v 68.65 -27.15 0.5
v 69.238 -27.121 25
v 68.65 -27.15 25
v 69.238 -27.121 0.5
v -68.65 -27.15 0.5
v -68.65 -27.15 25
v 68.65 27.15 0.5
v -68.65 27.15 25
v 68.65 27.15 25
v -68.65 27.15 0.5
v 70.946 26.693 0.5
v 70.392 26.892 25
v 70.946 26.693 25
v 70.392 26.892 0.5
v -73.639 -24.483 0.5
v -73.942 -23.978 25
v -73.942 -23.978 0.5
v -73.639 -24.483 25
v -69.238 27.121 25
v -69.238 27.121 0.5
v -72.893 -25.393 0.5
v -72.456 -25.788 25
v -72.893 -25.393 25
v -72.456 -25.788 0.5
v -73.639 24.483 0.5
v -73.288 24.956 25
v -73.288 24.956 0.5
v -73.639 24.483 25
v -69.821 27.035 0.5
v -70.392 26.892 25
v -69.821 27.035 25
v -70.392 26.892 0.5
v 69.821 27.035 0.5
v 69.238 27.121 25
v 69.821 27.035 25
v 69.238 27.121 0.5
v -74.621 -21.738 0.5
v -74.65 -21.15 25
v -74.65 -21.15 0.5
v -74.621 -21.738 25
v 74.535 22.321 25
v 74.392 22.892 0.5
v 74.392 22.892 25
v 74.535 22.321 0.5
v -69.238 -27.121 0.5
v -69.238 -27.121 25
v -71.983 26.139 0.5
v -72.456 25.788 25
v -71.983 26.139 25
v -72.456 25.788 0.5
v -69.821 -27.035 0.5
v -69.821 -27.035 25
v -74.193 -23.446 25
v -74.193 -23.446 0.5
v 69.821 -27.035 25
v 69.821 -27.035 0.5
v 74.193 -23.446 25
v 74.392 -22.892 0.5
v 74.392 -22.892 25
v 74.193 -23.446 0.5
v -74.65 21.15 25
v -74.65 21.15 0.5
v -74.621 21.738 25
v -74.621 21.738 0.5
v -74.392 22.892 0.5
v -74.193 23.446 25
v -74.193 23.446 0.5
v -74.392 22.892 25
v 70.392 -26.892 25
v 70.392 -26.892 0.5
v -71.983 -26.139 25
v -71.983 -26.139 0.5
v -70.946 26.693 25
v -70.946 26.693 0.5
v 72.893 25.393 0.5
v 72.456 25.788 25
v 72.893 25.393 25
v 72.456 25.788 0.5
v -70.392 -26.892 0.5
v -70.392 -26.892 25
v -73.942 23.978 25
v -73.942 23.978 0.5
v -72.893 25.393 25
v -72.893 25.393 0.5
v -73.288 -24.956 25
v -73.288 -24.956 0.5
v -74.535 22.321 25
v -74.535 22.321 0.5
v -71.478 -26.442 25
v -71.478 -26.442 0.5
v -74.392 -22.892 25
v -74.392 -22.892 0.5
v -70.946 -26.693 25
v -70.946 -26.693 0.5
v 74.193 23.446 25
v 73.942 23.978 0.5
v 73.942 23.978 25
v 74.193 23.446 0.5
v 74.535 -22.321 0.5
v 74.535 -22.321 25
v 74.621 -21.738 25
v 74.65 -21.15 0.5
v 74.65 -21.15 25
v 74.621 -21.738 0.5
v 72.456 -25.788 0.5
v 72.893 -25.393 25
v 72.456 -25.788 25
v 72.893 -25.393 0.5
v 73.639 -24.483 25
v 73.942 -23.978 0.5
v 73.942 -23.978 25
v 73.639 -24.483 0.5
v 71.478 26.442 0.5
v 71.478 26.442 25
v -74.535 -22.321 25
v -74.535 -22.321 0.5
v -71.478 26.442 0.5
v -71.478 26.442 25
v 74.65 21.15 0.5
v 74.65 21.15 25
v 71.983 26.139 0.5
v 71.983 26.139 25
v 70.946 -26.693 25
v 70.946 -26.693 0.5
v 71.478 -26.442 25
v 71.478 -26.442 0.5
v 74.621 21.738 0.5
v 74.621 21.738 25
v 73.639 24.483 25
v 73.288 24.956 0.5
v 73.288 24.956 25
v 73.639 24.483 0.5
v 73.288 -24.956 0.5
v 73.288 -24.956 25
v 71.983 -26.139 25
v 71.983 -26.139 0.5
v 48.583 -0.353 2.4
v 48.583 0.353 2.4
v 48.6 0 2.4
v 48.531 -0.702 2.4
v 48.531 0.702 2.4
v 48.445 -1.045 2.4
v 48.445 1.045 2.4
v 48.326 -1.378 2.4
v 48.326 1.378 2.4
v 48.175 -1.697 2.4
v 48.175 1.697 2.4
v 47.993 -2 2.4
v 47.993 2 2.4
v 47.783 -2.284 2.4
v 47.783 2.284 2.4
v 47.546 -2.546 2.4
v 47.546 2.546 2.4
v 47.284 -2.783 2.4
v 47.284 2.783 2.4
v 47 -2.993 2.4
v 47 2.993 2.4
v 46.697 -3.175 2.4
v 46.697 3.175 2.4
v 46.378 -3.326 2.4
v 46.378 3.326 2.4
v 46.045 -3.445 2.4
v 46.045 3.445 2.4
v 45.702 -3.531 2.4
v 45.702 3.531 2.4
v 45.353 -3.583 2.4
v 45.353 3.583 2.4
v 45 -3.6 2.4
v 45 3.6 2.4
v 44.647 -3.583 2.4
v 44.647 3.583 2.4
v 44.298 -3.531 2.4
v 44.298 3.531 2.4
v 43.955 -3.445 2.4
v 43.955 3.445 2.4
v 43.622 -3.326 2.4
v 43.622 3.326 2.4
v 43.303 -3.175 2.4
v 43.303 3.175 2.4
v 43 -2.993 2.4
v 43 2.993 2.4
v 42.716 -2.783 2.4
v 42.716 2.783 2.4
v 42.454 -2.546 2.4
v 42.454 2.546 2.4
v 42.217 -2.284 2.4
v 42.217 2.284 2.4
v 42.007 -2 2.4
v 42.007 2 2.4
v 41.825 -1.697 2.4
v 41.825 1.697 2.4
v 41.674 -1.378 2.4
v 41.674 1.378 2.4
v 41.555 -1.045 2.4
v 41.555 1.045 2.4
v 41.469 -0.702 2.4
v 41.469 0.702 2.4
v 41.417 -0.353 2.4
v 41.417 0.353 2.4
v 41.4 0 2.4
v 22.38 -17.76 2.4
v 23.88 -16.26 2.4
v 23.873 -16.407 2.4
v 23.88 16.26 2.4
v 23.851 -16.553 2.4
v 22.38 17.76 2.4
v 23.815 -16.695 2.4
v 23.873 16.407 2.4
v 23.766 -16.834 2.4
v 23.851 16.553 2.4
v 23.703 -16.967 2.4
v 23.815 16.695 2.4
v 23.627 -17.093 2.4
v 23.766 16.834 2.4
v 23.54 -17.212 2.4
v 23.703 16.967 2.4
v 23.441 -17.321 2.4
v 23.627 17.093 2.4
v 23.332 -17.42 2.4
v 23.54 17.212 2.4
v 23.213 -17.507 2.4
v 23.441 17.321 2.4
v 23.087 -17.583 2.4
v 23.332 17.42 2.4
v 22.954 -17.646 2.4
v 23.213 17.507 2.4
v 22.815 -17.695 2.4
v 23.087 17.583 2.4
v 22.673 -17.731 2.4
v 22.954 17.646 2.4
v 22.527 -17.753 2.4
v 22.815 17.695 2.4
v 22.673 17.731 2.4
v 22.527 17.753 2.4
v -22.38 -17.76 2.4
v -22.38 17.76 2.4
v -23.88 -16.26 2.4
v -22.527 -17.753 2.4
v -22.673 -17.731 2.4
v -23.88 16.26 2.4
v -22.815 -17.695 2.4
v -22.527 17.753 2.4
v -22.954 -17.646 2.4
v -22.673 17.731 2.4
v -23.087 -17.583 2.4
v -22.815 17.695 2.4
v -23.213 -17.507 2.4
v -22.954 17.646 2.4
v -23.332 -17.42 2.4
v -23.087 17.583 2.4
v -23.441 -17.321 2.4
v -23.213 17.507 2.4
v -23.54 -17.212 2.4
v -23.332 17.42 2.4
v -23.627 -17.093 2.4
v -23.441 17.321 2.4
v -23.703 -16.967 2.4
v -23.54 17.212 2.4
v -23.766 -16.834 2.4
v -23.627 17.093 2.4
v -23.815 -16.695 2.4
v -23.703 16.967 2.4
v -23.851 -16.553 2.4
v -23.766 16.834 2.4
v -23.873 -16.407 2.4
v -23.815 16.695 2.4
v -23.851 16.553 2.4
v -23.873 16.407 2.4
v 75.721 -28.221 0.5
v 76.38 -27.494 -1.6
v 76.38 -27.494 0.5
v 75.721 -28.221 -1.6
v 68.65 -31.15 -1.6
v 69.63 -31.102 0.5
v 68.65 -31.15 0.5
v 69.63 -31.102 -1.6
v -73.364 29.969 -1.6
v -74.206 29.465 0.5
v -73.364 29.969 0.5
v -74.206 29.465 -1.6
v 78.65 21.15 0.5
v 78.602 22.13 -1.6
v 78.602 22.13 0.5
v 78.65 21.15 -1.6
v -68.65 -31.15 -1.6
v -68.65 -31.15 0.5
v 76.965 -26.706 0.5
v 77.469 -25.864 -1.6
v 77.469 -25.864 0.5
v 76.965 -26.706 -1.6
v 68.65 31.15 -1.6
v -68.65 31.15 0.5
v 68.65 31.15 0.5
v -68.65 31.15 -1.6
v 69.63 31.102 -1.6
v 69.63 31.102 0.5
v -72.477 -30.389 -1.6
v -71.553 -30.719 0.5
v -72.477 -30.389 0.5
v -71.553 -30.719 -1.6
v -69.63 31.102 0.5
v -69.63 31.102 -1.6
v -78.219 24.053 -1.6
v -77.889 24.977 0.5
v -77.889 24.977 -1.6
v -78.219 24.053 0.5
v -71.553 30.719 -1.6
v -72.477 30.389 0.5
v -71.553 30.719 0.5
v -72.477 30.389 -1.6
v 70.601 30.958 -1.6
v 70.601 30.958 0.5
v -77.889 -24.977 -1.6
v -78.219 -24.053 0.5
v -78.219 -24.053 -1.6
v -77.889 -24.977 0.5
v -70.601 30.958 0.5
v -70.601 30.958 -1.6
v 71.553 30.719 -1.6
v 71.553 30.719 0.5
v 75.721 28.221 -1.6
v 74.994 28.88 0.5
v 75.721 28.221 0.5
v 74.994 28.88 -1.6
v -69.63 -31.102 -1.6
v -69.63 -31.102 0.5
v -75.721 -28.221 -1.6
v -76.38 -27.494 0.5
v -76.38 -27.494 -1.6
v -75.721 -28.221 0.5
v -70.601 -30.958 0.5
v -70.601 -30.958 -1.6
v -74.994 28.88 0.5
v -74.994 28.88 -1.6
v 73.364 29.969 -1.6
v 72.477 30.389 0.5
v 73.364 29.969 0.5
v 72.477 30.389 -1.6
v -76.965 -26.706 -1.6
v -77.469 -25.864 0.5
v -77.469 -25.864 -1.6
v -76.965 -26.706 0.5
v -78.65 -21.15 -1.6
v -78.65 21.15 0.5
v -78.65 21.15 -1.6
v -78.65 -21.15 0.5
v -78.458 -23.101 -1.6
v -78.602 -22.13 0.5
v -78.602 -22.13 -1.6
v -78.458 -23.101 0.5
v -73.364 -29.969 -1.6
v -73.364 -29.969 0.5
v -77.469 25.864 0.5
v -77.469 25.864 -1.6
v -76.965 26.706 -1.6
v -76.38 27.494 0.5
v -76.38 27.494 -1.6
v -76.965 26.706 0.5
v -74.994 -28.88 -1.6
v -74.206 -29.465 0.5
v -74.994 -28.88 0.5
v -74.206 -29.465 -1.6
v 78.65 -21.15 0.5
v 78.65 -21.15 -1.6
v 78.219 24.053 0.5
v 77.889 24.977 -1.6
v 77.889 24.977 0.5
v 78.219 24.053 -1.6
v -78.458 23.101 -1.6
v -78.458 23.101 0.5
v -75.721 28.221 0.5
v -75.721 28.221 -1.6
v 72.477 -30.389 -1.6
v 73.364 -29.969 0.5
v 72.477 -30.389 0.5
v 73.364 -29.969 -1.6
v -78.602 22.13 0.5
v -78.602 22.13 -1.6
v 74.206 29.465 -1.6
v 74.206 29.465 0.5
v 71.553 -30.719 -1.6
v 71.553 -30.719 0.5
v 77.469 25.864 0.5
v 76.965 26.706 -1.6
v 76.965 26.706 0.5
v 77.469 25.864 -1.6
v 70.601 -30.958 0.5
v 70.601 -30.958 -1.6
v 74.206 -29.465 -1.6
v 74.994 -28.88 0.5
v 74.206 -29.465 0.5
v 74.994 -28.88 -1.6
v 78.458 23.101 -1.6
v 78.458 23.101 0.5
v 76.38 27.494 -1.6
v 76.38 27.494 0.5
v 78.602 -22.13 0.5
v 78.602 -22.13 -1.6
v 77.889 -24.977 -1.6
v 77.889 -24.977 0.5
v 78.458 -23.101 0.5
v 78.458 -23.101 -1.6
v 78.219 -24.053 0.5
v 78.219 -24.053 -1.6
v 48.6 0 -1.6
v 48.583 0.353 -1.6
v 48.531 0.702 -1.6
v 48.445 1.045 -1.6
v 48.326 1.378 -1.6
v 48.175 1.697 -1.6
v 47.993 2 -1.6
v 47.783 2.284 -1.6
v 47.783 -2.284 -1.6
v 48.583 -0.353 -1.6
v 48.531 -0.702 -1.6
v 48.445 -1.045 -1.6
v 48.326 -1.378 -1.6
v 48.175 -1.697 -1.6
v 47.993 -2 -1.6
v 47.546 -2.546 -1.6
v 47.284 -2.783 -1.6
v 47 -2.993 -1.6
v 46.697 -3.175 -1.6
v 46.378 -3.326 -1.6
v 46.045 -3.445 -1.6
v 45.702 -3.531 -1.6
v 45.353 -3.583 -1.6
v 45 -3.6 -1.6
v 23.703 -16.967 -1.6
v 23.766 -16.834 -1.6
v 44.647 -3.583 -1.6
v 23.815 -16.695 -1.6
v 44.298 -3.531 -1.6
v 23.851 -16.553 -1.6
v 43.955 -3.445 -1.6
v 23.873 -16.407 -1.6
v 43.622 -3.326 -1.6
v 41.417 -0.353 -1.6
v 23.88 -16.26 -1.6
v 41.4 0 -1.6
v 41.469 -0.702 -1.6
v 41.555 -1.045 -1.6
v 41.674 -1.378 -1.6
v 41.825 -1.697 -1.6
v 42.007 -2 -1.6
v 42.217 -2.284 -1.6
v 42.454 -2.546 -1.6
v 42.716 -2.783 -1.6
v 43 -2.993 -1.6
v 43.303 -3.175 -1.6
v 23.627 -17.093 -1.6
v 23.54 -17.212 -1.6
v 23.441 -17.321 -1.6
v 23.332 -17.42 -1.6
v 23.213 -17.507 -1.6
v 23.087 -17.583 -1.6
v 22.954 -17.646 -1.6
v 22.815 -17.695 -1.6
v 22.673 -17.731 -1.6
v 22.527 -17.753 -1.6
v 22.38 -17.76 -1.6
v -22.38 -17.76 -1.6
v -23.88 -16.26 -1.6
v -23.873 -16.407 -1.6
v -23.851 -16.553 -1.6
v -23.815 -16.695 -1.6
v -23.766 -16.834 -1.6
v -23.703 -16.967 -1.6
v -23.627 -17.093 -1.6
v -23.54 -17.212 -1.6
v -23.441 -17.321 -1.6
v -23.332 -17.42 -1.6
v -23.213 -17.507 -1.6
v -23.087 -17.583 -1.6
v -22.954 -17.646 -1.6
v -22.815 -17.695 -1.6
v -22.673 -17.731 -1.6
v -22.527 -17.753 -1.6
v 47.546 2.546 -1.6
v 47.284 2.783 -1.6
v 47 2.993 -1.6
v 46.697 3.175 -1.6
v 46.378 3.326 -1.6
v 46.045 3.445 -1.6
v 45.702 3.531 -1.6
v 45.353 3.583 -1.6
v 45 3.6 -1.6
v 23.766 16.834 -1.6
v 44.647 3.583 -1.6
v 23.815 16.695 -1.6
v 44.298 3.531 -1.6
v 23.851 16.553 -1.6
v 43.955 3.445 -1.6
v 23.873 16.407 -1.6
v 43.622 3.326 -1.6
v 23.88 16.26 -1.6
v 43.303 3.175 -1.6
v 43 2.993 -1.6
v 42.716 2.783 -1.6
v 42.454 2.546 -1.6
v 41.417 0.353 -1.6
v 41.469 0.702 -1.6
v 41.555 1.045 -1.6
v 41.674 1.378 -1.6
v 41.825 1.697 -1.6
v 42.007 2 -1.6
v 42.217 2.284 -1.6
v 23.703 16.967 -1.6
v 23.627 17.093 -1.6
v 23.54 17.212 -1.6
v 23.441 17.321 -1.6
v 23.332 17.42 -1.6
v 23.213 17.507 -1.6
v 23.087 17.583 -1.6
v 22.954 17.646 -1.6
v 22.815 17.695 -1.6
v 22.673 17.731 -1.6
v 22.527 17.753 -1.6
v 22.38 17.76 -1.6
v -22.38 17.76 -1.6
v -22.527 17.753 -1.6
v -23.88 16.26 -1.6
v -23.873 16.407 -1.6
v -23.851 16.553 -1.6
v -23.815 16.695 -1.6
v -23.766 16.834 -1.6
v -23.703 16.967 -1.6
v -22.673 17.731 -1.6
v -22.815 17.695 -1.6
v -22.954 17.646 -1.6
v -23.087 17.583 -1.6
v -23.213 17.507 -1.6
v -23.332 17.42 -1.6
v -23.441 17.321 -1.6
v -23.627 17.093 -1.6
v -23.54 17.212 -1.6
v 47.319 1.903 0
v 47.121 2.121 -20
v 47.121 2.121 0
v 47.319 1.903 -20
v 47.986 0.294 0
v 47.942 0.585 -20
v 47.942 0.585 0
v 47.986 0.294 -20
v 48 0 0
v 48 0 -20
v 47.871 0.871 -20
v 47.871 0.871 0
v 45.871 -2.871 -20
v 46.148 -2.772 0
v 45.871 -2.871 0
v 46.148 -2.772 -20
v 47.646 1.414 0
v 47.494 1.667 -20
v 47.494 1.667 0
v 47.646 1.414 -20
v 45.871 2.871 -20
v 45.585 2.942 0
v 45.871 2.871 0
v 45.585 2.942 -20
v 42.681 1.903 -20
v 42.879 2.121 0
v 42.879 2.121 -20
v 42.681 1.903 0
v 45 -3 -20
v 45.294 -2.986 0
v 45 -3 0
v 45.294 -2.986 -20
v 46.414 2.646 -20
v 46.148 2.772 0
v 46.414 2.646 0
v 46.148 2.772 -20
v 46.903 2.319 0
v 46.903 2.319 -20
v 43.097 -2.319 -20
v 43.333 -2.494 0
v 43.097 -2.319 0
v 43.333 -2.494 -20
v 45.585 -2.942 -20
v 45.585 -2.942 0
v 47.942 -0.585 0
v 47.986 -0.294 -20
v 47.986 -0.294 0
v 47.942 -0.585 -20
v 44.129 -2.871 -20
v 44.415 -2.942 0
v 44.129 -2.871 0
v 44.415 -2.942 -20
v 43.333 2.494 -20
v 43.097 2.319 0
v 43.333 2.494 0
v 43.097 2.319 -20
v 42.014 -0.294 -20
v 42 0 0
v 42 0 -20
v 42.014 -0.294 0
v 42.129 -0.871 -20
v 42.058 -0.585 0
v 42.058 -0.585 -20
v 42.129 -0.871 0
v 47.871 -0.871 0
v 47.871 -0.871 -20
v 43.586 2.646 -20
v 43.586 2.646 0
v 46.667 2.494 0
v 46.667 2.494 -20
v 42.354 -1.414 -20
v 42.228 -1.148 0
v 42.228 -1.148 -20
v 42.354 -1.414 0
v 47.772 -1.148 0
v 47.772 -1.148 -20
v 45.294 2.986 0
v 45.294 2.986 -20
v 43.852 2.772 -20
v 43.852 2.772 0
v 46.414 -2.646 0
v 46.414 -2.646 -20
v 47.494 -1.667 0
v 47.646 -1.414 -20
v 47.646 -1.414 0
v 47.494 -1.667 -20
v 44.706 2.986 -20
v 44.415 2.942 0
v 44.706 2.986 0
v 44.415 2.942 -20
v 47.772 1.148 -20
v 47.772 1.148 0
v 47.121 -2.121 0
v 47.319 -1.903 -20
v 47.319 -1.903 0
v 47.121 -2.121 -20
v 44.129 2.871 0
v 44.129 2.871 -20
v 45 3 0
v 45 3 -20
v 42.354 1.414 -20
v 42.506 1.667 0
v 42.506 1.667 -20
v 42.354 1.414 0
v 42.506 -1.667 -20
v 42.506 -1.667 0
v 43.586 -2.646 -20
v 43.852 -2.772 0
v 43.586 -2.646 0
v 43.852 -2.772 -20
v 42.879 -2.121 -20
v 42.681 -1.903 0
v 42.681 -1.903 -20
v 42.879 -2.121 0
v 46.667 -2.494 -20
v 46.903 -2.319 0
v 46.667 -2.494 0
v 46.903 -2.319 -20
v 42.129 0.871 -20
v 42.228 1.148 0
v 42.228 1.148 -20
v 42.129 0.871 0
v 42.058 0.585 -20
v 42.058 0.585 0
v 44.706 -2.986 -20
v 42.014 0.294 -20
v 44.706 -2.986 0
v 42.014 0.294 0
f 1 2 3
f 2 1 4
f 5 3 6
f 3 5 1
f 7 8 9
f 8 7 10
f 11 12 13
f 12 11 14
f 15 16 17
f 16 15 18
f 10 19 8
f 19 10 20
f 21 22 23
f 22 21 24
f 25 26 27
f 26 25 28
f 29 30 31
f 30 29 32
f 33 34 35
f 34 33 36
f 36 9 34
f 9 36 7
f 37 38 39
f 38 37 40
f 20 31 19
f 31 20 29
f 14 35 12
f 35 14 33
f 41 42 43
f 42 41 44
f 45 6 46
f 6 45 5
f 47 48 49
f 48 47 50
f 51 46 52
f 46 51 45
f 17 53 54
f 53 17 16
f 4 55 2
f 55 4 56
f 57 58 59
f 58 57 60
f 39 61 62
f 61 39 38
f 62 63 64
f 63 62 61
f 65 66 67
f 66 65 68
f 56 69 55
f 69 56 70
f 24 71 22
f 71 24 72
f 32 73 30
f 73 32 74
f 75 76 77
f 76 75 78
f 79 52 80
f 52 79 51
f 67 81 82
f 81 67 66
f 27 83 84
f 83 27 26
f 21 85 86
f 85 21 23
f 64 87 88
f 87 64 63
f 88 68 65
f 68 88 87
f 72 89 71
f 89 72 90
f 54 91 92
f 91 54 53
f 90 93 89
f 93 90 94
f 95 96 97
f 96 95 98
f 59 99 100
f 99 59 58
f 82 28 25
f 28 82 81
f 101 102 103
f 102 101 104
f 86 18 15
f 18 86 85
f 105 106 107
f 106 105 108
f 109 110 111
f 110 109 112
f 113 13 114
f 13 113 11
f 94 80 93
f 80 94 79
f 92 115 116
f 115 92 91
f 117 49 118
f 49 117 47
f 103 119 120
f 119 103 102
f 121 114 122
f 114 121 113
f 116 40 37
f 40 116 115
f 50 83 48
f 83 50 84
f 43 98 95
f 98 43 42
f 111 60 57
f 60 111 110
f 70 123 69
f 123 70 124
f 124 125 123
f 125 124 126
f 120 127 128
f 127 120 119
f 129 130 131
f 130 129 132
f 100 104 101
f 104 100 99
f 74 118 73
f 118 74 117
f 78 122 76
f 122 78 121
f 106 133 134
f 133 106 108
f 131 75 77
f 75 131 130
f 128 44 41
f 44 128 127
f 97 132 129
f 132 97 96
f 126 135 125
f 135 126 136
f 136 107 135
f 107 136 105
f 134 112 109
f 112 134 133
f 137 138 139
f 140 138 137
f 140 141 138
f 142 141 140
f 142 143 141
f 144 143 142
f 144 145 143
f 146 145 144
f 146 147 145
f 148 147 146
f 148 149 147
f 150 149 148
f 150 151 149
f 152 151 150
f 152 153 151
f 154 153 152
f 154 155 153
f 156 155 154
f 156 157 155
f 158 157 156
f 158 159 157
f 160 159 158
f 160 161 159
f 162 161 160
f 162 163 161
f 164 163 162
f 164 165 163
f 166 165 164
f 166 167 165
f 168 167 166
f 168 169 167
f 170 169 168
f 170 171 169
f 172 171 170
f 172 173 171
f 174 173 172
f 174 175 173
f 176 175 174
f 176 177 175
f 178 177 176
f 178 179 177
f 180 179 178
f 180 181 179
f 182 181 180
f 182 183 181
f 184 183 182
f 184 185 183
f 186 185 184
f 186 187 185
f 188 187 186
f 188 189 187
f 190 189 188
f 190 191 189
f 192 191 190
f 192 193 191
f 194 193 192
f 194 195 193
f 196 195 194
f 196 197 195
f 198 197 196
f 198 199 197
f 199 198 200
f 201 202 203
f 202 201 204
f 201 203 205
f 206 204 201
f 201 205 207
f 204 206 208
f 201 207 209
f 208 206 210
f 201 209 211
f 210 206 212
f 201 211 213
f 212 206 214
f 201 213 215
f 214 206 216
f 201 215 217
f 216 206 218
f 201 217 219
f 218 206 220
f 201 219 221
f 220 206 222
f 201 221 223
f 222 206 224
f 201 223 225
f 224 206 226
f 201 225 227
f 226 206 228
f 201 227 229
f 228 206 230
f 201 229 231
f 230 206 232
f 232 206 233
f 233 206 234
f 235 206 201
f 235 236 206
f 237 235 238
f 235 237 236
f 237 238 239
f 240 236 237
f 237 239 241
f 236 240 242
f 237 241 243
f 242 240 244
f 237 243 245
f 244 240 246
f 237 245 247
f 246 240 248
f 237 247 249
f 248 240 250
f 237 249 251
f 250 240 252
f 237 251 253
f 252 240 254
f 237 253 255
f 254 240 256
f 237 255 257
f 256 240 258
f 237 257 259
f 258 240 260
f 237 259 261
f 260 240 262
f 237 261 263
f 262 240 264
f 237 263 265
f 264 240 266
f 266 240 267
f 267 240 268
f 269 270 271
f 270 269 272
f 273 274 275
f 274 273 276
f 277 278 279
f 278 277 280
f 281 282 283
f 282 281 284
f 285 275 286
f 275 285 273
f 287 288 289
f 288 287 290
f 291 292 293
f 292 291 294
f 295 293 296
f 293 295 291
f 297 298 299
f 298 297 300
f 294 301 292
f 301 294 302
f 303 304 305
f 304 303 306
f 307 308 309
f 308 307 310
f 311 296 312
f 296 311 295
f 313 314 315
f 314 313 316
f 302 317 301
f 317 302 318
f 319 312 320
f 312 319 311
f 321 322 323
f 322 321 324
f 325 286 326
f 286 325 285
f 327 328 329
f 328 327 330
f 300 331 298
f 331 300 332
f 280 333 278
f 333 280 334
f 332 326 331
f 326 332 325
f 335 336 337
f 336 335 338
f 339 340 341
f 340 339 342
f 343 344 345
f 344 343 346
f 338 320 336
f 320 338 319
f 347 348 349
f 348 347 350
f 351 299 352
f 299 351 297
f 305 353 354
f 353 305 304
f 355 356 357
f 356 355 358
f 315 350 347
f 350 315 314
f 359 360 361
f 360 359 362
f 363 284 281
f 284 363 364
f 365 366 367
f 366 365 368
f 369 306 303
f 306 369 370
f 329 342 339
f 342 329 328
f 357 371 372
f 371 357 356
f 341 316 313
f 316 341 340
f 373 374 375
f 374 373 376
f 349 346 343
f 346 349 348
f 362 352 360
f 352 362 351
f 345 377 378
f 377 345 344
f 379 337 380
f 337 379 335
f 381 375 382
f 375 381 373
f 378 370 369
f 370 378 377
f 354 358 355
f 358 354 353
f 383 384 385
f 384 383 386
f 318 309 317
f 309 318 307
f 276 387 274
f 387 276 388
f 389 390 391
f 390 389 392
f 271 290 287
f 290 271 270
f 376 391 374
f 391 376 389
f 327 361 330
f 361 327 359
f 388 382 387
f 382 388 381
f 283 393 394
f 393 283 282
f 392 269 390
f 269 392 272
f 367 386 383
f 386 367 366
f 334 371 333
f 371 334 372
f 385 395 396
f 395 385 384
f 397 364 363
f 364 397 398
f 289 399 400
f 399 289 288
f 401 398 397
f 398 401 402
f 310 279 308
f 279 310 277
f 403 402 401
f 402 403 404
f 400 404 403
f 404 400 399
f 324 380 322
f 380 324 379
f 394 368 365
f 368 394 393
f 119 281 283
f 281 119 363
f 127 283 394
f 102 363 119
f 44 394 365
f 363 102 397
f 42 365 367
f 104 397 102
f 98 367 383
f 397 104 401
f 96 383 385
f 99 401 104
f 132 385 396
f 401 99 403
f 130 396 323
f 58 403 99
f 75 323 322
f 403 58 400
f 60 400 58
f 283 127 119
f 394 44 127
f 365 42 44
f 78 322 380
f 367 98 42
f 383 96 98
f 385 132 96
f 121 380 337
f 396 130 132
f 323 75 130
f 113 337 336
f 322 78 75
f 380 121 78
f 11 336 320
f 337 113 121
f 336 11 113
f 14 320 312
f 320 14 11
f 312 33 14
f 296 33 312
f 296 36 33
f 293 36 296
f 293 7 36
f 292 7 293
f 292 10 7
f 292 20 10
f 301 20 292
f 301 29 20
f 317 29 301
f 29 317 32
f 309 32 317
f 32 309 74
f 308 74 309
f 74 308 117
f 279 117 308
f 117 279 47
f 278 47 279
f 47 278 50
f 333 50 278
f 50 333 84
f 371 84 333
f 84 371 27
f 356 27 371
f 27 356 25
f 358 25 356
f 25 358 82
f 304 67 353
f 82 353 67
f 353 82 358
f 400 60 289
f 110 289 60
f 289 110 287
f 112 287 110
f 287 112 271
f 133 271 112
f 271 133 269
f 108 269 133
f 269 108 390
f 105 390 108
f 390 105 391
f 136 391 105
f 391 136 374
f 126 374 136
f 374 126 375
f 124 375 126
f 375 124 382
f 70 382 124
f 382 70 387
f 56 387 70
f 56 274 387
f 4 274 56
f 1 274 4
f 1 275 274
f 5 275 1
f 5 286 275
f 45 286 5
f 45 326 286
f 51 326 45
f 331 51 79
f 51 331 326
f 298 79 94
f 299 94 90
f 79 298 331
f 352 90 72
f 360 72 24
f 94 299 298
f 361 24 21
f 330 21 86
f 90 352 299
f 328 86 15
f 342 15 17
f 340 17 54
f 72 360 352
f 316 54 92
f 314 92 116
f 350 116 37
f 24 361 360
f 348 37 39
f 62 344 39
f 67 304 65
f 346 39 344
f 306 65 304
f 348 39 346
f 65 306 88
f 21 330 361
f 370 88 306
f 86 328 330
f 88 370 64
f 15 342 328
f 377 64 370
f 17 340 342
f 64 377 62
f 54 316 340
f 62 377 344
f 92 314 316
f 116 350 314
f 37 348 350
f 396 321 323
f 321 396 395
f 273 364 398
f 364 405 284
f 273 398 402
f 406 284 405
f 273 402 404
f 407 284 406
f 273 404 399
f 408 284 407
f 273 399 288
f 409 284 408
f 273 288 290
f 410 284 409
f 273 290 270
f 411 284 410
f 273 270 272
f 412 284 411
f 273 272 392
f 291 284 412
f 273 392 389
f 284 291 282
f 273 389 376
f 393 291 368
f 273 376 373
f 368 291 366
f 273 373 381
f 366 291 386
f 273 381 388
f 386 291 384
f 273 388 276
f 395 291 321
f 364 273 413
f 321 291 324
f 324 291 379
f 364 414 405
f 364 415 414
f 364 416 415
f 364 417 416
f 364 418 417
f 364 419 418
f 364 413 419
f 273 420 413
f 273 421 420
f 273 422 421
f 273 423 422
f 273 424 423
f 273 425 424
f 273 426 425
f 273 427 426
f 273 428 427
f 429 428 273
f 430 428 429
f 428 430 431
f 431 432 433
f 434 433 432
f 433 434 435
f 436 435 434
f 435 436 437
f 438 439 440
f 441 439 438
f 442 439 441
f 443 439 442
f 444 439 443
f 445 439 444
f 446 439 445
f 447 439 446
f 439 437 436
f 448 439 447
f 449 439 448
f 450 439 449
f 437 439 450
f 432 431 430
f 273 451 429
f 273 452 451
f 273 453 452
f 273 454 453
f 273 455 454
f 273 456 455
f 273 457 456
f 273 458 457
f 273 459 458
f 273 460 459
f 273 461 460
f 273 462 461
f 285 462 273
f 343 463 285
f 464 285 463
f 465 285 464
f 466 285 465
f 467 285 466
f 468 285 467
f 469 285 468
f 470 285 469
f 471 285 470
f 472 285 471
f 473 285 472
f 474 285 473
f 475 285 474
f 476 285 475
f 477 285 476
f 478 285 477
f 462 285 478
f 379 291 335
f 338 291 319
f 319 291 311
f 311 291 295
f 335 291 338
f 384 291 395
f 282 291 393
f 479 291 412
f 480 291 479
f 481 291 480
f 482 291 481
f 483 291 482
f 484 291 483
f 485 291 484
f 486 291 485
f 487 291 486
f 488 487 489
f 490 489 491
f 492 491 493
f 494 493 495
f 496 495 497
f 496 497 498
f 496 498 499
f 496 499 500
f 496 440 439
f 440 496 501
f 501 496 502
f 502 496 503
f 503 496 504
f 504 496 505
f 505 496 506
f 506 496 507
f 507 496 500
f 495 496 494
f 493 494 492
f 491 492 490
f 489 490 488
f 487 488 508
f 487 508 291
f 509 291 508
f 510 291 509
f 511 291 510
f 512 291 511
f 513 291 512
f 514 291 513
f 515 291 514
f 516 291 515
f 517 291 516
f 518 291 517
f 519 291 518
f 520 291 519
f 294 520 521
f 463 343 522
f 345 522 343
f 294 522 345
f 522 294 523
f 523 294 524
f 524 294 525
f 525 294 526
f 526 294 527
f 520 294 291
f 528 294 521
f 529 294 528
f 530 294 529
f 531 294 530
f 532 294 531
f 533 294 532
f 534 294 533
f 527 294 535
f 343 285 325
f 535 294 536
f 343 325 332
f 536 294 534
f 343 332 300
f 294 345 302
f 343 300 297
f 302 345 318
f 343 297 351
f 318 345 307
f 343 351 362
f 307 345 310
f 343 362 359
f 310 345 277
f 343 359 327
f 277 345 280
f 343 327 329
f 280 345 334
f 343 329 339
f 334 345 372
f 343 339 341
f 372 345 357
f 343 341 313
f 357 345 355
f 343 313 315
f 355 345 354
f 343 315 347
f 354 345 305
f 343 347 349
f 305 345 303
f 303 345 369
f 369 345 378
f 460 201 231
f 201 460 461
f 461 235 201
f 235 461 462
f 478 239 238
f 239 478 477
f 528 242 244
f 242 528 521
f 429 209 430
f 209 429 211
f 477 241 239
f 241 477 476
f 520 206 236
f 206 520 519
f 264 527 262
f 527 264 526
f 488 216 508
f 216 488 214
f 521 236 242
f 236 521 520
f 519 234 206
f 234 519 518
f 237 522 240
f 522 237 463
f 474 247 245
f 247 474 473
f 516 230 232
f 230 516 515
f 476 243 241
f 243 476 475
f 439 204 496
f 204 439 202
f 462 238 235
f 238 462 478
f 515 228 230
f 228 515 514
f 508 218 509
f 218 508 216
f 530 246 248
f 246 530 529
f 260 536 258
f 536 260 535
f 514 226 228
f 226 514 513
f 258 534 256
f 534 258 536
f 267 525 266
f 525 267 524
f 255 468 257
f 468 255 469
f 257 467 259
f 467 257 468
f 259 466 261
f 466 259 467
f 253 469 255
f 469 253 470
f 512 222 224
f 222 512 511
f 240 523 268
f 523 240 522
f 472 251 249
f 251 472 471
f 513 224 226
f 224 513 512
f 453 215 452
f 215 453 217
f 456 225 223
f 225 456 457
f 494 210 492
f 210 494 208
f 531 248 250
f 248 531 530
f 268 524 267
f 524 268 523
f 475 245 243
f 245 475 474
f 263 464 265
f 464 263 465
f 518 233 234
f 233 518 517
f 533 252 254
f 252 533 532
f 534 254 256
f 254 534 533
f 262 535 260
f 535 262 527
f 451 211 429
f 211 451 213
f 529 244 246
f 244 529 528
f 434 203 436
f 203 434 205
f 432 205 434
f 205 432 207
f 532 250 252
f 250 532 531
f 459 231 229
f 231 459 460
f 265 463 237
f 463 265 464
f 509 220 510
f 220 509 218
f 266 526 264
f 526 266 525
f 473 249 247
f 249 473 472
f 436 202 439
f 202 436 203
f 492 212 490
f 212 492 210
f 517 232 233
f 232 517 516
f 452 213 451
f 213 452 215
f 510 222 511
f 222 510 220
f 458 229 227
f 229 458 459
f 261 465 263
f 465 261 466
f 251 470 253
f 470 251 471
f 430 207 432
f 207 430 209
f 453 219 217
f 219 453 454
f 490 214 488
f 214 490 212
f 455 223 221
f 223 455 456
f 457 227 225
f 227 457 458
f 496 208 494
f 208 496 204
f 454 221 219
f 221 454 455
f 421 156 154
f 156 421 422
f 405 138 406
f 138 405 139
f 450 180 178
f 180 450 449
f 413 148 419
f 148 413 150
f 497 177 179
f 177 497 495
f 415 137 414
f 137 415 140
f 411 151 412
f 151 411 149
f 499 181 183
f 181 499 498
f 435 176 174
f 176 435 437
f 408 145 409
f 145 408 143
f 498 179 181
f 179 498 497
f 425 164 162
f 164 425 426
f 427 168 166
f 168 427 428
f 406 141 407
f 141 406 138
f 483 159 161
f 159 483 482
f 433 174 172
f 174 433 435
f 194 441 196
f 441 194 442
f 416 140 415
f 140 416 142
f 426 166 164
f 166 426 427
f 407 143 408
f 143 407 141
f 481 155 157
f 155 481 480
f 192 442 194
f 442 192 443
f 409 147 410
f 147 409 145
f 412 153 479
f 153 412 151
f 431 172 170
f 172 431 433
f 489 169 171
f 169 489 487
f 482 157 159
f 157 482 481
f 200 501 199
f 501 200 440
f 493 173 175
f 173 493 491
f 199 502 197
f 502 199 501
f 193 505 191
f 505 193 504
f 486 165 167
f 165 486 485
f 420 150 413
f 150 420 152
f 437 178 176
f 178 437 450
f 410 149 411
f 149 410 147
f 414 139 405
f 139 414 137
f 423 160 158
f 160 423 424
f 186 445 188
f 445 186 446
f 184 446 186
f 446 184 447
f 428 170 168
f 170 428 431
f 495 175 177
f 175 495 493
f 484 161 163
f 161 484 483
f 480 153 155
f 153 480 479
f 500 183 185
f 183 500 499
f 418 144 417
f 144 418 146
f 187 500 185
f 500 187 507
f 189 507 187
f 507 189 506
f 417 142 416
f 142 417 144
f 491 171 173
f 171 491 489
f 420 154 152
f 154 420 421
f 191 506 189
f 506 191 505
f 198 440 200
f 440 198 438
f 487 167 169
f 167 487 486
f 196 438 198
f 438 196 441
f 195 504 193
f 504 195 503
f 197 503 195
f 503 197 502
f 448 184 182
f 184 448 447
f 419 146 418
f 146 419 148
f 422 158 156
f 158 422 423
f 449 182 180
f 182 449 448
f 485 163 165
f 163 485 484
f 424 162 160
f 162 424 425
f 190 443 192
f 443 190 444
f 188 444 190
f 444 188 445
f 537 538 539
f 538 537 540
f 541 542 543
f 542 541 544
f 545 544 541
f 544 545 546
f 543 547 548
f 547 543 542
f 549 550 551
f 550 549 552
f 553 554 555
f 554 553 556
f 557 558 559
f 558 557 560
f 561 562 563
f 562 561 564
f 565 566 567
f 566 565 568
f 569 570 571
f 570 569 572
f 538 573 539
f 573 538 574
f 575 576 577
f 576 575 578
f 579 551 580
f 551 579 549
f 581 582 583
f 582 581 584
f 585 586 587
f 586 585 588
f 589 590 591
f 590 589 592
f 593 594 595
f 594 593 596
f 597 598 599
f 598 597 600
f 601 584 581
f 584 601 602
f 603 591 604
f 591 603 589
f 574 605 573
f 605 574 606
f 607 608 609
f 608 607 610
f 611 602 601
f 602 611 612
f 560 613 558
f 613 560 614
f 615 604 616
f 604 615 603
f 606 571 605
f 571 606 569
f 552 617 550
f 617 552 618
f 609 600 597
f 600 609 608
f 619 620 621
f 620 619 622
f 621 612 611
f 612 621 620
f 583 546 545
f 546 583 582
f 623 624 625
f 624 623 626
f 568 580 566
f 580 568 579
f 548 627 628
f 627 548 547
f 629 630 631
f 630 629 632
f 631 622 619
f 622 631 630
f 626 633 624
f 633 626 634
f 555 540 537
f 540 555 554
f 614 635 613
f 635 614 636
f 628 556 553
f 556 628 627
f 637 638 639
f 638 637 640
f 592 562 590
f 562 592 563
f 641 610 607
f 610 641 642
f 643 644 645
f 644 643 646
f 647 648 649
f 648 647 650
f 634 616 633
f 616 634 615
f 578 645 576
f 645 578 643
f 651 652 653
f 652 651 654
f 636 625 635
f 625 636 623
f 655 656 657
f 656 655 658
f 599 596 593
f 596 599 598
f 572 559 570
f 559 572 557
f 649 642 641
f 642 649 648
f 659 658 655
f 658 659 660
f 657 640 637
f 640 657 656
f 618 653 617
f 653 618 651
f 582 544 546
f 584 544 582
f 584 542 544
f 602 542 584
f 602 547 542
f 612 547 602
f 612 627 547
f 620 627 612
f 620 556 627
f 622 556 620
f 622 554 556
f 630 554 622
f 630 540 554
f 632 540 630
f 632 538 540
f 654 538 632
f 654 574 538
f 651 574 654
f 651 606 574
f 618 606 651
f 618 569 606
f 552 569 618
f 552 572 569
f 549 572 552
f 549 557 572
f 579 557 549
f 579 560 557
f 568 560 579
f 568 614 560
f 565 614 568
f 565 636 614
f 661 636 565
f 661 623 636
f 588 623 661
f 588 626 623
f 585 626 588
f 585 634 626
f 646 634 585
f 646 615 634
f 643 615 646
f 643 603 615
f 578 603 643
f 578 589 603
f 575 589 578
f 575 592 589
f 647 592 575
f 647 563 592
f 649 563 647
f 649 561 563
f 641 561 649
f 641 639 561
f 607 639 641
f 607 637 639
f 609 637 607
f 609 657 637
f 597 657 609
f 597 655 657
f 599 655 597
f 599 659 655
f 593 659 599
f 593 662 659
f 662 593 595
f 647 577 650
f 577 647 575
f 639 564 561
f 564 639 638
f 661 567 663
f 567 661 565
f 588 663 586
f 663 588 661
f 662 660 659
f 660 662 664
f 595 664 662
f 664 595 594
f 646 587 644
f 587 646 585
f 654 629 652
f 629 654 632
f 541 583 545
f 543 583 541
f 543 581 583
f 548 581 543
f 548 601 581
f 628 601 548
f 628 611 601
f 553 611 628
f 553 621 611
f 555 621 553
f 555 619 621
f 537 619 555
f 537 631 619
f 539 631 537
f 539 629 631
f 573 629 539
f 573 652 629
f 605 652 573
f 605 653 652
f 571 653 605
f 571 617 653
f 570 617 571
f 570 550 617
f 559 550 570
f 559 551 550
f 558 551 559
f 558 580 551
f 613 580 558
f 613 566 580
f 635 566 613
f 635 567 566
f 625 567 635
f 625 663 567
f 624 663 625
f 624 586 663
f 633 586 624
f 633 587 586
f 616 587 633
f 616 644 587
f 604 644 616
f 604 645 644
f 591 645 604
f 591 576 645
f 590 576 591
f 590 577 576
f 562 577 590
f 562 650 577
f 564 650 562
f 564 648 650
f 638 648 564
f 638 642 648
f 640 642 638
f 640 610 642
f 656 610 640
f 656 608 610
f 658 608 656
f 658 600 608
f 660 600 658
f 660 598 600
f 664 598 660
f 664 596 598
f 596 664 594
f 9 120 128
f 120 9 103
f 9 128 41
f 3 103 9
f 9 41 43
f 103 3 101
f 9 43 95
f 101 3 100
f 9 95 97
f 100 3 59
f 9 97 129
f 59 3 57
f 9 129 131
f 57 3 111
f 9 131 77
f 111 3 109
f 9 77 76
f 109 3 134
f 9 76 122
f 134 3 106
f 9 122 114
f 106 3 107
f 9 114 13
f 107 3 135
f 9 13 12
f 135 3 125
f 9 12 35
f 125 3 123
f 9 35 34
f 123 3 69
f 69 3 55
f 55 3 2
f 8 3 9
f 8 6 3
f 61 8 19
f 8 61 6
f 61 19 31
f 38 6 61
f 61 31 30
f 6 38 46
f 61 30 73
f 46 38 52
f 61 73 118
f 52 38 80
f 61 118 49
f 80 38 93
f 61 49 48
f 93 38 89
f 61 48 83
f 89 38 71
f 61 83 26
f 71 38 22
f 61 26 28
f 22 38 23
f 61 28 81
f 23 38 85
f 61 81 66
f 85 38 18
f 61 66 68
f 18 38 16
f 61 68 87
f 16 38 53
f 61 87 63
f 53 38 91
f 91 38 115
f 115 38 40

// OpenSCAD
// ============================================================
//  vent-insert.scad — BMW F30 driver-side air vent → screen + encoder insert
//
//  CONCEPT: do NOT reprint the vent. Keep the OEM assembly (wood trim, chrome
//  strip, thumbwheel, spring clips, duct + foam gasket, shutoff damper). Cut out
//  ONLY the louvers and the centre tab, then drop this insert into the opening.
//  Its flange hides the cut edges. Reversible in spirit, and it keeps every hard
//  part (sealing, retention, damper) as the factory made it.
//
//  ── MEASUREMENT POLICY ──────────────────────────────────────────────────────
//  Numbers marked  ### MEASURE ###  are NOT known. They are placeholders so the
//  model previews. The real BMW vent aperture is not published anywhere (checked),
//  and the supplied Meshy scan has no real-world scale (arbitrary units, 2.2 M
//  verts, AI-reconstructed) — so it CANNOT be used for fitting dimensions.
//  Replace each one with a caliper reading before printing anything.
//
//  Numbers marked  [VERIFIED]  are from datasheets/vendor specs — leave them
//  alone unless your specific part differs.
//
//  PRINT IN ASA OR PETG. NOT PLA. A dash in summer sun exceeds PLA's ~60 °C
//  glass transition and the part will sag and fall out.
// ============================================================

/* [Scan-derived proportions — USE THESE TO CROSS-CHECK YOUR MEASUREMENTS]
   Extracted from the supplied Meshy scan by bounding-box analysis over all
   2,197,028 vertices. A bounding box over that many points is statistically
   robust even though the surface itself is noisy, so these RATIOS are usable
   even though the scan's absolute scale is meaningless.

        overall  W : H : D  =  1 : 0.4709 : 0.6065

   So: measure the overall vent width once, and the other two follow.
   Set vent_overall_w below and the model will echo the expected height/depth —
   if your calipers disagree badly, something's wrong and you should re-measure.

   NOT extractable from the scan (proven, not assumed): the louver aperture,
   corner radii, and internal depth. Two computational attempts failed because
   the mesh has no dominant surface plane — the largest normal cluster is only
   0.1% of vertices, i.e. it's reconstructed blob, not flat molded faces.       */
vent_overall_w    = 0;     // ### MEASURE ### overall vent width; 0 = skip check

/* [Vent aperture — MEASURE THESE FIRST] */
// Width of the louver opening (inner aperture of the black surround)
vent_w            = 150;   // ### MEASURE ###
// Height of that opening
vent_h            = 55;    // ### MEASURE ###
// Corner radius of the opening
vent_corner_r     = 6;     // ### MEASURE ###
// Usable depth from the face plane back to the first obstruction (damper/vane).
// THIS IS THE CRITICAL ONE — it decides whether the screen+PCB fit at all.
vent_depth_avail  = 25;    // ### MEASURE ###
// How much lip/bezel the flange can overlap without fouling the trim
flange_overlap    = 4;     // ### MEASURE ###

/* [Insert construction] */
plate_t           = 2.4;   // faceplate thickness
flange_t          = 1.6;   // flange thickness (sits proud on the bezel)
wall              = 2.0;   // side wall thickness
fit_clearance     = 0.35;  // per-side gap so it actually drops in (print-tuned)
screen_bezel_lap  = 0.6;   // faceplate overlaps LCD active edge, hides the border

/* [Airflow — keep the vent working]
   A screen that blocks the whole aperture turns a working vent into a blank.
   P3Cars' vent-integrated display retains airflow, and your own servo/temp plan
   depends on air still moving (cold air = free cooling for the stack, hot air =
   servo shuts the damper). So the insert carries flow slots around the screen. */
airflow           = true;
slot_w            = 3.2;   // slot width
slot_gap          = 3.0;   // gap between slots
slot_margin       = 3.0;   // keep slots this far off the screen pocket + edges

/* [2.4" ILI9341 module — VERIFIED, change only if your module differs] */
// PCB 43 x 72 x 5 mm; active area 36.72 x 48.96 mm
scr_pcb_w         = 72.0;  // [VERIFIED] long axis — mounted LANDSCAPE
scr_pcb_h         = 43.0;  // [VERIFIED]
scr_pcb_t         = 5.0;   // [VERIFIED] board + components
scr_act_w         = 48.96; // [VERIFIED] active area long axis
scr_act_h         = 36.72; // [VERIFIED]
// Offset of the active area centre from the PCB centre.
scr_act_dx        = 0;     // ### MEASURE ### (on your module)
scr_act_dy        = 0;     // ### MEASURE ###
scr_pocket_clear  = 0.4;   // slack around the PCB in its pocket

/* [EC11 encoder — partially verified] */
ec11_body         = 12.5;  // [VERIFIED] ~12.5 mm square body
ec11_body_h       = 7.5;   // [VERIFIED] body height behind panel
ec11_bush_d       = 7.2;   // M7x0.75 bushing -> 7 mm hole + clearance  ### CONFIRM ###
ec11_shaft_len    = 20;    // ### MEASURE ### varies by variant; sets knob standoff
// Encoder centre, measured from the insert centre (+x = toward the thumbwheel side)
enc_x             = 45;    // ### CHOOSE after measuring aperture ###
enc_y             = 0;

/* [Teensy carrier — mounts behind the insert]
   The Teensy lives AT the vent, not in the remote box: the TFT is SPI at tens of
   MHz and will not survive a multi-foot cable run, and encoder edges pick up
   noise. Local MCU -> one robust cable (12 V + UART/CAN) back to the main box.
   See ../interconnect.md.                                                     */
teensy_w          = 61.0;  // ### CONFIRM ### Teensy 4.1 length
teensy_h          = 18.0;  // ### CONFIRM ### width
teensy_t          = 4.0;   // board + headers clearance
carrier_t         = 2.6;
boss_d            = 7.0;   // mounting bosses on the insert's back
boss_screw_d      = 2.6;   // M2.5 self-tap
boss_inset        = 9.0;   // from the aperture edge

/* [Render] */
$fn               = 64;
explode           = 0;     // set >0 to separate parts in preview
// "print" = insert only, ready to slice.  "preview" = adds ghost screen/encoder/
// depth-envelope so you can eyeball clearances. NEVER slice a preview export:
// the ghosts are separate solids and would be printed.
render_mode       = "preview";   // ["print","preview"]

// ============================================================
//  Sanity checks — the model tells you if it cannot fit
// ============================================================
inner_w = vent_w - 2*fit_clearance;
inner_h = vent_h - 2*fit_clearance;

// Scan-derived proportions (bounding box over 2,197,028 vertices)
SCAN_H_RATIO = 0.4709;
SCAN_D_RATIO = 0.6065;

module _checks() {
    if (vent_overall_w > 0) {
        echo(str("SCAN CROSS-CHECK: for overall width ", vent_overall_w,
                 " mm, the scan proportions predict overall height ",
                 vent_overall_w * SCAN_H_RATIO, " mm and overall depth ",
                 vent_overall_w * SCAN_D_RATIO, " mm."));
        echo("  -> compare against your calipers. Large disagreement = re-measure.");
        if (vent_depth_avail > vent_overall_w * SCAN_D_RATIO)
            echo(str("*** WARN: usable depth ", vent_depth_avail,
                     " mm exceeds the part's whole predicted depth ",
                     vent_overall_w * SCAN_D_RATIO, " mm. Check measurement #3."));
    }
    if (scr_pcb_w > inner_w)
        echo(str("*** FAIL: screen PCB ", scr_pcb_w, " mm wider than aperture ",
                 inner_w, " mm. Screen will not fit landscape."));
    if (scr_pcb_h > inner_h)
        echo(str("*** FAIL: screen PCB ", scr_pcb_h, " mm taller than aperture ",
                 inner_h, " mm."));
    if (scr_pcb_t + plate_t > vent_depth_avail)
        echo(str("*** FAIL: screen stack ", scr_pcb_t + plate_t,
                 " mm deeper than available ", vent_depth_avail, " mm."));
    if (abs(enc_x) + ec11_body/2 > inner_w/2)
        echo("*** FAIL: encoder falls outside the aperture.");
    // Does the screen + encoder both fit across the width?
    needed = scr_pcb_w + ec11_body + 4;
    if (needed > inner_w)
        echo(str("*** WARN: screen + encoder need ", needed,
                 " mm across; aperture is ", inner_w,
                 " mm. Consider stacking the encoder below, or a smaller screen."));
}

// ============================================================
//  Helpers
// ============================================================
module rrect(w, h, r, t) {           // rounded rectangular prism
    linear_extrude(height = t)
        offset(r = r) offset(r = -r)
            square([w, h], center = true);
}

// ============================================================
//  The insert
// ============================================================
// Parts must OVERLAP, not merely touch. Coincident planes are not reliably fused
// by CGAL and produce disconnected solids (caught in testing: Volumes reported 4,
// i.e. 3 separate bodies, instead of 2 for one closed solid).
ov = 0.5;   // interference between mating features

module vent_insert() {
    difference() {
        union() {
            // faceplate that sits in the aperture
            rrect(inner_w, inner_h, vent_corner_r, plate_t);
            // flange, proud of the face, hides the cut louver edges.
            // Extended UP into the plate by `ov` so the two fuse.
            translate([0, 0, -flange_t])
                rrect(inner_w + 2*flange_overlap,
                      inner_h + 2*flange_overlap,
                      vent_corner_r + flange_overlap, flange_t + ov);
            // side walls going back into the vent, stiffen + locate.
            // Started `ov` BELOW the plate top so they bite into it.
            translate([0, 0, plate_t - ov])
                difference() {
                    rrect(inner_w, inner_h, vent_corner_r, wall_depth() + ov);
                    translate([0, 0, -0.1])
                        rrect(inner_w - 2*wall, inner_h - 2*wall,
                              max(vent_corner_r - wall, 0.5), wall_depth() + ov + 0.2);
                }
            // pocket walls that capture the screen PCB (also overlapped)
            translate([0, 0, plate_t - ov]) screen_pocket_walls();
            // bosses the Teensy carrier screws into
            mount_bosses();
        }

        // --- screen window (active area, minus a small overlap to hide the border)
        translate([scr_act_dx, scr_act_dy, -flange_t - 1])
            rrect(scr_act_w - 2*screen_bezel_lap,
                  scr_act_h - 2*screen_bezel_lap, 1.5,
                  plate_t + flange_t + 2);

        // --- encoder bushing hole
        translate([enc_x, enc_y, -flange_t - 1])
            cylinder(d = ec11_bush_d, h = plate_t + flange_t + 2);

        // --- airflow slots (keep the vent venting)
        if (airflow) airflow_slots();
    }
}

// Vertical slots through the faceplate + flange, in the clear areas either side
// of the screen pocket, skipping anything that would hit the encoder.
module airflow_slots() {
    pocket_half = (scr_pcb_w + 2*scr_pocket_clear + 2*1.6) / 2;
    slot_h = inner_h - 2*slot_margin - 2*wall;
    pitch  = slot_w + slot_gap;
    // how far out we may go before hitting the side wall
    outer  = inner_w/2 - wall - slot_margin;
    inner_edge = pocket_half + slot_margin;

    if (outer > inner_edge + slot_w) {
        n = floor((outer - inner_edge) / pitch);
        for (side = [-1, 1])
            for (i = [0 : n - 1]) {
                x = side * (inner_edge + slot_w/2 + i * pitch);
                // skip if this slot would foul the encoder bushing
                if (abs(x - enc_x) > (ec11_bush_d/2 + slot_w/2 + 1.5))
                    translate([x, 0, -flange_t - 1])
                        linear_extrude(height = plate_t + flange_t + 2)
                            offset(r = slot_w/2) offset(r = -slot_w/2)
                                square([slot_w, slot_h], center = true);
            }
    } else {
        echo("*** NOTE: no room for airflow slots beside the screen. Vent will be blocked - consider a smaller screen, or slots above/below.");
    }
}

function wall_depth() = min(vent_depth_avail - plate_t, scr_pcb_t + 6);

// Mounting boss positions, shared by the insert and the carrier so the two
// parts can never drift out of alignment.
function boss_pts() = [
    [-(inner_w/2 - boss_inset),  (inner_h/2 - boss_inset)],
    [ (inner_w/2 - boss_inset),  (inner_h/2 - boss_inset)],
    [-(inner_w/2 - boss_inset), -(inner_h/2 - boss_inset)],
    [ (inner_w/2 - boss_inset), -(inner_h/2 - boss_inset)]
];

// Bosses standing off the back of the faceplate for the carrier to screw into.
module mount_bosses() {
    h = wall_depth();
    for (p = boss_pts())
        translate([p[0], p[1], plate_t - ov])
            difference() {
                cylinder(d = boss_d, h = h + ov);
                translate([0, 0, 1.5])
                    cylinder(d = boss_screw_d, h = h + ov);
            }
}

// Carrier plate: holds the Teensy, relieves the loom, screws to the bosses.
module carrier() {
    difference() {
        union() {
            rrect(inner_w - 2*wall - 1, inner_h - 2*wall - 1, 3, carrier_t);
            // Teensy pocket rails
            translate([0, 0, carrier_t - ov])
                difference() {
                    rrect(teensy_w + 2*2.2, teensy_h + 2*2.2, 2, teensy_t + ov);
                    translate([0, 0, ov])
                        rrect(teensy_w + 0.6, teensy_h + 0.6, 1, teensy_t + 1);
                }
        }
        // screw clearance matching the insert's bosses
        for (p = boss_pts())
            translate([p[0], p[1], -1])
                cylinder(d = boss_screw_d + 0.9, h = carrier_t + 4);
        // loom exit + strain-relief tie slots
        translate([0, -(inner_h/2 - wall - 8), -1])
            rrect(16, 7, 2.5, carrier_t + 4);
        for (s = [-1, 1])
            translate([s*13, -(inner_h/2 - wall - 8), -1])
                rrect(2.6, 7, 1.2, carrier_t + 4);
    }
}

module screen_pocket_walls() {
    pw = scr_pcb_w + 2*scr_pocket_clear;
    ph = scr_pcb_h + 2*scr_pocket_clear;
    difference() {
        rrect(pw + 2*1.6, ph + 2*1.6, 2, scr_pcb_t + ov);
        // inner cavity kept clear of the plate so the ring still fuses to it
        translate([0, 0, ov]) rrect(pw, ph, 1.5, scr_pcb_t + 0.2);
    }
}

// ============================================================
//  Reference ghosts (not printed) — check clearances visually
// ============================================================
module ghost_screen() {
    color("SteelBlue", 0.35)
        translate([0, 0, plate_t + explode])
            rrect(scr_pcb_w, scr_pcb_h, 1.5, scr_pcb_t);
}
module ghost_encoder() {
    color("Tomato", 0.35)
        translate([enc_x, enc_y, plate_t + explode]) {
            rrect(ec11_body, ec11_body, 0.5, ec11_body_h);
            translate([0, 0, -plate_t - ec11_shaft_len])
                cylinder(d = 6, h = ec11_shaft_len);
        }
}
// Envelope of the depth we are allowed to occupy
module ghost_depth_limit() {
    color("Green", 0.10)
        translate([0, 0, plate_t])
            rrect(inner_w, inner_h, vent_corner_r, vent_depth_avail - plate_t);
}

// ============================================================
_checks();

if (render_mode == "print_carrier") {
    carrier();
} else {
    vent_insert();
    // Ghosts are reference-only and EXCLUDED from print modes so they can never
    // end up in a sliced STL.
    if (render_mode == "preview") {
        ghost_screen();
        ghost_encoder();
        ghost_depth_limit();
        translate([0, 0, plate_t + wall_depth() + 2 + explode])
            color("Plum", 0.5) carrier();
    }
}
